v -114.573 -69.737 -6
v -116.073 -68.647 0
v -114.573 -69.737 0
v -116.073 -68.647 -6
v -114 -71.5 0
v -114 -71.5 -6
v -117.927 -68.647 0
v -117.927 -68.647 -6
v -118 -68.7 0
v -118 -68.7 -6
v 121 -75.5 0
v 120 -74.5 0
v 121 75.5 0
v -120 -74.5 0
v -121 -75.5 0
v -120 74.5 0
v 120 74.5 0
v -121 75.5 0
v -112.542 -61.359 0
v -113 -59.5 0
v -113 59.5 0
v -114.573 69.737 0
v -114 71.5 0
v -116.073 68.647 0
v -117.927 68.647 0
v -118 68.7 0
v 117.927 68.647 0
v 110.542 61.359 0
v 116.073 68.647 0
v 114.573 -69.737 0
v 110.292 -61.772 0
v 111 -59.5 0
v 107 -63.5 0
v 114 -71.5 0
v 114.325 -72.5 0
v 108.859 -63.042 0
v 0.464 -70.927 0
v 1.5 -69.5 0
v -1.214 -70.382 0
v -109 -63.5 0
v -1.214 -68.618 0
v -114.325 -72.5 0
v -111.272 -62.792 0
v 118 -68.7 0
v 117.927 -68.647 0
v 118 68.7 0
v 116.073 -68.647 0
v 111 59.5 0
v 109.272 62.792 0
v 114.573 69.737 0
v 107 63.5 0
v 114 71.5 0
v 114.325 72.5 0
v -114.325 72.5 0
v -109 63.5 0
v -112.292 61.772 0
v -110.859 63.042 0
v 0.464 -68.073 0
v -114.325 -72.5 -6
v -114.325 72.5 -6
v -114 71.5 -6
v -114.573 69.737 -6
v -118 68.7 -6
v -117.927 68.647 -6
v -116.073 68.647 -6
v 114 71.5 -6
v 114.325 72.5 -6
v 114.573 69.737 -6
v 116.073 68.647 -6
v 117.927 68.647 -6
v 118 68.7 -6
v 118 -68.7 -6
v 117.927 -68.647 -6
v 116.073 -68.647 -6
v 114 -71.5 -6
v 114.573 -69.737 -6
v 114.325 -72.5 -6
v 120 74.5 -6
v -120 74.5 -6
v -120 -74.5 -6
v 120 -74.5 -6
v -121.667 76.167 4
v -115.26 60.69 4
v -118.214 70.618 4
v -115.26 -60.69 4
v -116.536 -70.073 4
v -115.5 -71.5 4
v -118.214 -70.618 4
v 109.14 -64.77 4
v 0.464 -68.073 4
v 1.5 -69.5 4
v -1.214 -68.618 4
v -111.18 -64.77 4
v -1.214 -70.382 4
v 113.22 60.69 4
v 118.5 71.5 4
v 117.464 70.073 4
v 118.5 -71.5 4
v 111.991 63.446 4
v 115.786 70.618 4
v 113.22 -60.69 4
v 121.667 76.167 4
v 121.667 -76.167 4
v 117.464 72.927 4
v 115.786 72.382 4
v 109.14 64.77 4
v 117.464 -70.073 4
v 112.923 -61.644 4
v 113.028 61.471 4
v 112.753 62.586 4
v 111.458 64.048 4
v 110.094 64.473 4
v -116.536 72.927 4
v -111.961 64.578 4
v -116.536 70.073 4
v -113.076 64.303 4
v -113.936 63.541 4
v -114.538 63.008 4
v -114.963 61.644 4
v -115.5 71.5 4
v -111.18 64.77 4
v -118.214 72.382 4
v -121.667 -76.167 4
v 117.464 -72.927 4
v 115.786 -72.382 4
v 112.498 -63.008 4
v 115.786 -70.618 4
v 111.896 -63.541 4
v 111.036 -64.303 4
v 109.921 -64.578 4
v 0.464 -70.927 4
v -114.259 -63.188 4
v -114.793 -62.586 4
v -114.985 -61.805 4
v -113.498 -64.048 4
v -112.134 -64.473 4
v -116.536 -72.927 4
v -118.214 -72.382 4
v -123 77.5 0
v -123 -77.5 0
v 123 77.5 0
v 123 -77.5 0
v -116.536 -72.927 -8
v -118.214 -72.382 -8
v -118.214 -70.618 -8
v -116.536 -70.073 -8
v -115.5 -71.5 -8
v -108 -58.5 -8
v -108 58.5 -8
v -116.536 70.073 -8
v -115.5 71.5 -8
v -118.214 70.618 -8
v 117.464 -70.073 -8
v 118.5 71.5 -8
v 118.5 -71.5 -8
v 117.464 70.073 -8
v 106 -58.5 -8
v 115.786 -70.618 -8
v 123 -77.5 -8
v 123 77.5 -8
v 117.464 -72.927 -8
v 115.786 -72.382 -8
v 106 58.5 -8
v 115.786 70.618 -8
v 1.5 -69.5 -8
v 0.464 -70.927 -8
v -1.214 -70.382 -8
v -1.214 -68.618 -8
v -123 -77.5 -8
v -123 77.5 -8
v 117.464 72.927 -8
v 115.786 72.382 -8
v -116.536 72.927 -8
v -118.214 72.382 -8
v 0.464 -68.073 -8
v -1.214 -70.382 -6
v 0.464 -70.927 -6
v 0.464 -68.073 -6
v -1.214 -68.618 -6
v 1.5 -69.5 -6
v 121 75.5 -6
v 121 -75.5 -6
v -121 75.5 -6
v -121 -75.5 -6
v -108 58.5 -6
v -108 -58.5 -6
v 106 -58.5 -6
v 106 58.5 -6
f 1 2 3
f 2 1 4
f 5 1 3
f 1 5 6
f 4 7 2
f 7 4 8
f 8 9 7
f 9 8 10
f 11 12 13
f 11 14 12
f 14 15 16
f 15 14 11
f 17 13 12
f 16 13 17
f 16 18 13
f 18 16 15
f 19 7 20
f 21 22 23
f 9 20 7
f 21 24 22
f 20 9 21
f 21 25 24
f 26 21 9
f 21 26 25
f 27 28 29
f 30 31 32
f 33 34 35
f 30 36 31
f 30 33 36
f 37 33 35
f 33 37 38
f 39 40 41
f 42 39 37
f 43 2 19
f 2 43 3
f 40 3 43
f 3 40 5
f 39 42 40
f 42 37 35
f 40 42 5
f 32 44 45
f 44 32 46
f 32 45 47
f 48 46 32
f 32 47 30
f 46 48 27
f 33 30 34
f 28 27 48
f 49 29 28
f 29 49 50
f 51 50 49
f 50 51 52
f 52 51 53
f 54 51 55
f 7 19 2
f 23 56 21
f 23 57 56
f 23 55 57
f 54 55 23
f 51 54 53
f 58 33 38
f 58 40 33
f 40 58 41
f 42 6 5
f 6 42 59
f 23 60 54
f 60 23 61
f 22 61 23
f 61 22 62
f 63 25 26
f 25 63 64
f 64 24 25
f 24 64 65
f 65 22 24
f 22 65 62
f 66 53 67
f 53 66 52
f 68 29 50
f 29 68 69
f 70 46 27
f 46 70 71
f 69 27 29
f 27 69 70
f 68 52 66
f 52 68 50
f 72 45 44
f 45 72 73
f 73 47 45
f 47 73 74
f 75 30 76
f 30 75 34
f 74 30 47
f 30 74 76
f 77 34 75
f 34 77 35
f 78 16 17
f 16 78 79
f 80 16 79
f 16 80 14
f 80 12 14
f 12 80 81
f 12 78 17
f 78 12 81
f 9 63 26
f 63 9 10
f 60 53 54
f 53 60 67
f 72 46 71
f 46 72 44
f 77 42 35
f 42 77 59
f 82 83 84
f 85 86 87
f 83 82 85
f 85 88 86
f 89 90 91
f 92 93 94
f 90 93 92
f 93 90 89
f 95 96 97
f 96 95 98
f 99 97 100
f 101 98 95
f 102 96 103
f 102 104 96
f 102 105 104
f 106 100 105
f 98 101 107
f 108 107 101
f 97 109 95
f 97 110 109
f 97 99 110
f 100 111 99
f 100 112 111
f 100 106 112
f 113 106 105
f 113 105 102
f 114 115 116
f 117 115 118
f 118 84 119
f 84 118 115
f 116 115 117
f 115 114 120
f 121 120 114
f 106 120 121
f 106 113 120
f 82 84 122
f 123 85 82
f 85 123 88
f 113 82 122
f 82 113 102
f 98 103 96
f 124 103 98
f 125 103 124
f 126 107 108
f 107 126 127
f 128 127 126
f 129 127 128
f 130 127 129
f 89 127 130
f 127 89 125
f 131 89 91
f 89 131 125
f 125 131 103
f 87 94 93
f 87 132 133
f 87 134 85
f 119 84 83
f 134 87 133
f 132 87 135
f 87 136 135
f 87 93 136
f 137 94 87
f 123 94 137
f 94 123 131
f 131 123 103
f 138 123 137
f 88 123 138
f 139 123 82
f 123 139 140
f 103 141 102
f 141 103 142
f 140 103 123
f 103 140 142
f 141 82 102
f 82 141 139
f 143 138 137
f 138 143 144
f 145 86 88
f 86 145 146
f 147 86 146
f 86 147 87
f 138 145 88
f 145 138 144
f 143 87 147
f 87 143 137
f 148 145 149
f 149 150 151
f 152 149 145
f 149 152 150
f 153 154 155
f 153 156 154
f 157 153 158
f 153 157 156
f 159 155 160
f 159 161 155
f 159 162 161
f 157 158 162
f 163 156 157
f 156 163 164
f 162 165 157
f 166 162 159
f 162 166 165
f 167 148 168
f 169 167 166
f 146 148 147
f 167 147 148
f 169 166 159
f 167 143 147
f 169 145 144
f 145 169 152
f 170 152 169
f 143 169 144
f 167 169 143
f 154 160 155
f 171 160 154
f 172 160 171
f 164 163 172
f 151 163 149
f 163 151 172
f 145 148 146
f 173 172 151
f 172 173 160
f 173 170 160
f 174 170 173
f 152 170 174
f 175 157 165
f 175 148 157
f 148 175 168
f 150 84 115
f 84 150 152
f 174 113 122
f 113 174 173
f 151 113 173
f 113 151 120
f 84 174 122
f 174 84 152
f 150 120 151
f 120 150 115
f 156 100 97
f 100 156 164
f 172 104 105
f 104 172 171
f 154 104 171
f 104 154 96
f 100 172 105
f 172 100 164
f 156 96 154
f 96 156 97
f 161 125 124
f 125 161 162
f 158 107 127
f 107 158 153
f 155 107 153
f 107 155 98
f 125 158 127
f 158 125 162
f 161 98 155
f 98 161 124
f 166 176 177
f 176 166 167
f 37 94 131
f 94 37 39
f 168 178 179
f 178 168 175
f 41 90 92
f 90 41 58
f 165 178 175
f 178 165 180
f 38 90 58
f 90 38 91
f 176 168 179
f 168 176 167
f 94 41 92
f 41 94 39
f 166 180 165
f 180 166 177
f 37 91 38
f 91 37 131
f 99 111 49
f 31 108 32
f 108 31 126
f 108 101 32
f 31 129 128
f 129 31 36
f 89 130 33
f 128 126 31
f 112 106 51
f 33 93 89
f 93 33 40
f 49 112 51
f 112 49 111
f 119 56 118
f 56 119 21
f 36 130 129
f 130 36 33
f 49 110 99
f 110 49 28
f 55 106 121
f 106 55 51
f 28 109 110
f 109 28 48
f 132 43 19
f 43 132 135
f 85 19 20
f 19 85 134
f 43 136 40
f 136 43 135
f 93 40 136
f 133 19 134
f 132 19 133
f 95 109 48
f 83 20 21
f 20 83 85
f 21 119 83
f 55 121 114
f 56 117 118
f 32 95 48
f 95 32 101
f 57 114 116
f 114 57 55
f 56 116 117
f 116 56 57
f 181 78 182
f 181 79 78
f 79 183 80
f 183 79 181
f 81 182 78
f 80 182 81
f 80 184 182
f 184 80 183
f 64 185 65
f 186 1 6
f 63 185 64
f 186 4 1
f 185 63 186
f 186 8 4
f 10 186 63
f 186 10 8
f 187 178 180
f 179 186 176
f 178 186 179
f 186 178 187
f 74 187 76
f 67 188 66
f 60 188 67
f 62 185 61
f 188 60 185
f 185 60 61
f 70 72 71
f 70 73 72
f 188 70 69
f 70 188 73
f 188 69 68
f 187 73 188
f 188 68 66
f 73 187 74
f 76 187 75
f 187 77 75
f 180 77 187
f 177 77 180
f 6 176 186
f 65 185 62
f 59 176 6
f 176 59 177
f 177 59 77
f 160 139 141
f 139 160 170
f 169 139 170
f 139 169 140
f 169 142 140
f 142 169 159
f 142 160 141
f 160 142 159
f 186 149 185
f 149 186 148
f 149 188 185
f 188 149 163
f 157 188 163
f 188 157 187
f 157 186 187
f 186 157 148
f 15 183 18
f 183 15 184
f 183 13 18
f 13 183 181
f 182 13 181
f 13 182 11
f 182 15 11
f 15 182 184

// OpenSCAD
// file: frame_config.scad
have_buttons=0;

display_width=234;
display_height=143;
display_top_bezel=8;
display_bottom_bezel=8;
display_left_bezel=4;
display_right_bezel=6;

flange_height=5;
flange_gap=1;
flange_width=2;

faceplate_inset=2;
faceplate_lside_width=(have_buttons==1)? 22 : 6;
faceplate_rside_width=(have_buttons==1)? 20 : 6;
faceplate_top_width=6;
faceplate_bottom_width=(have_buttons==1)? 18 : 6;
faceplate_thickness=4;

backframe_thickness=8;
backframe_center_thickness=2;
backframe_inset=5;

button_width=10;
button_height=6;
button_thickness=faceplate_thickness+2;
button_rad=1;
num_bot_buttons=6;
num_side_buttons=5;
button_bottom_offset=5;
button_side_offset=5;

pcb_boss_radius=1;
pcb_thickness=1.5;

button_boss_radius=3;
button_boss_height=3.5;

backframe_boss_radius=3;
backframe_boss_height=backframe_thickness-pcb_thickness-button_boss_height;

frame_boss_radius=3;

cut_gap=.2;

// Vector of display corners
display_corners = [
    [-display_width/2-faceplate_lside_width,-display_height/2-faceplate_bottom_width,0],
    [-display_width/2-faceplate_lside_width,display_height/2+faceplate_top_width,0],
    [display_width/2+faceplate_rside_width,display_height/2+faceplate_top_width,0],
    [display_width/2+faceplate_rside_width,-display_height/2-faceplate_bottom_width,0]
];
// main file
include <frame_config.scad>

module frame_hole() {
    cylinder(h=backframe_thickness*2, r=1.5);
}

module frame_holes() {
    offset = frame_boss_radius+3;
    fho = [[offset,offset,-backframe_thickness],
        [offset,-offset,-backframe_thickness],
        [-offset,-offset,-backframe_thickness],
        [-offset,offset,-backframe_thickness]];
    trans = display_corners + fho;
    
    translate(trans[0])
        frame_hole();
    translate(trans[1])
        frame_hole();
    translate(trans[2])
        frame_hole();
    translate(trans[3])
        frame_hole();
    translate([0,-display_height/2-faceplate_bottom_width+button_bottom_offset+button_height/2,-backframe_thickness])
        frame_hole();
}

module flange(ht) {
    linear_extrude(height=ht, center=false) {
        polygon(points=[
            [-display_width/2-flange_gap,-display_height/2-flange_gap],
            [-display_width/2-flange_gap, display_height/2+flange_gap],
            [display_width/2+flange_gap, display_height/2+flange_gap],
            [display_width/2+flange_gap, -display_height/2-flange_gap],
            [-display_width/2-flange_width-flange_gap,-display_height/2-flange_width-flange_gap],
            [-display_width/2-flange_width-flange_gap, display_height/2+flange_width+flange_gap],
            [display_width/2+flange_width+flange_gap, display_height/2+flange_width+flange_gap],
            [display_width/2+flange_width+flange_gap, -display_height/2-flange_width-flange_gap]],
            paths=[[0,1,2,3],[4,5,6,7]]);
    }
}

module faceplate() {
    linear_extrude(height=faceplate_thickness, center=true) {
        polygon(points=[
            [-display_width/2+faceplate_inset+display_left_bezel,-display_height/2+faceplate_inset+display_bottom_bezel],
            [-display_width/2+faceplate_inset+display_left_bezel, display_height/2-faceplate_inset-display_top_bezel],
            [display_width/2-faceplate_inset-display_right_bezel, display_height/2-faceplate_inset-display_top_bezel],
            [display_width/2-faceplate_inset-display_right_bezel, -display_height/2+faceplate_inset+display_bottom_bezel],
            [-display_width/2-faceplate_lside_width,-display_height/2-faceplate_bottom_width],
            [-display_width/2-faceplate_lside_width, display_height/2+faceplate_top_width],
            [display_width/2+faceplate_rside_width, display_height/2+faceplate_top_width],
            [display_width/2+faceplate_rside_width, -display_height/2-faceplate_bottom_width]],
            paths=[[0,1,2,3],[4,5,6,7]]);
    }
}

module button_hole() {
    minkowski() {
        cube([button_width, button_height, faceplate_thickness], center=true);
        cylinder(r=button_rad, h=1, $fn=50);
    }
}

module bottom_button_holes() {
    for(i=[0:num_bot_buttons-1]) {
        xint = display_width/(num_bot_buttons+1);
        x = xint * (num_bot_buttons/2 - i);
        translate([x-xint/2,-display_height/2-faceplate_bottom_width+button_bottom_offset+button_height/2,2])
            button_hole();
    }
}

module left_button_holes() {
    for(i=[0:num_side_buttons-1]) {
        yint = display_height/(num_side_buttons+1);
        y = yint * (num_side_buttons/2 - i);
        translate([-display_width/2-faceplate_lside_width+button_side_offset+button_width/2,y-yint/2,2])
            button_hole();
    }
}

module right_button_holes() {
    for(i=[0:num_side_buttons-1]) {
        yint = display_height/(num_side_buttons+1);
        y = yint * (num_side_buttons/2 - i);
        translate([display_width/2+faceplate_rside_width-button_side_offset-button_width/2,y-yint/2,2])
            button_hole();
    }
}

module button_holes() {
    left_button_holes();
    bottom_button_holes();
    right_button_holes();
}

module button_pcb_boss() {
    cylinder(h=button_boss_height,r=button_boss_radius);
    translate([0,0,-pcb_thickness])
        cylinder(h=pcb_thickness,r=pcb_boss_radius,$fn=36);
}

module left_button_pcb_bosses() {
    for(i=[0:num_side_buttons]) {
        yint = display_height/(num_side_buttons+1);
        y = yint * (num_side_buttons/2 - i + 1);
        translate([-display_width/2-faceplate_lside_width+button_side_offset+button_width/2,y-yint,-button_boss_height])
           button_pcb_boss();
    }
}
    
module right_button_pcb_bosses() {
    for(i=[0:num_side_buttons]) {
        yint = display_height/(num_side_buttons+1);
        y = yint * (num_side_buttons/2 - i + 1);
        translate([display_width/2+faceplate_rside_width-button_side_offset-button_width/2,y-yint,-button_boss_height])
            button_pcb_boss();
        }
}
    
module bottom_button_pcb_bosses() {
    for(i=[0:num_bot_buttons]) {
        xint = display_width/(num_bot_buttons+1);
        x = xint * (num_bot_buttons/2 - i + 1);
        translate([x-xint,-display_height/2-    faceplate_bottom_width+button_bottom_offset+button_height/2,-button_boss_height])
            button_pcb_boss();
    }
}

module outside_trim() {
    linear_extrude(height=display_width*2, center=true)
        polygon(points=[[-2,0],[-2,faceplate_thickness+2],[2,faceplate_thickness+2],[0,0],[-2,0]]);
}

module outside_trim_all() {
    translate([-display_width/2-faceplate_lside_width,0,0])
        rotate(a=[90,0,0])
            outside_trim();
    translate([display_width/2+faceplate_rside_width,0,0])
        rotate(a=[90,0,180])
            outside_trim();
    translate([0,-display_height/2-faceplate_bottom_width,0])
        rotate(a=[90,0,90])
            outside_trim();
    translate([0,display_height/2+faceplate_top_width,0])
        rotate(a=[90,0,-90])
            outside_trim();
}

module faceplate_inner_trim() {
    linear_extrude(height=10, scale=1.05)
    offset(r=faceplate_inset+2)
        polygon(points=[
            [-display_width/2+faceplate_inset+2+display_left_bezel,-display_height/2+faceplate_inset+2+display_bottom_bezel],
            [-display_width/2+faceplate_inset+2+display_left_bezel, display_height/2-faceplate_inset-2-display_top_bezel],
            [display_width/2-faceplate_inset-2-display_right_bezel, display_height/2-faceplate_inset-2-display_top_bezel],
            [display_width/2-faceplate_inset-2-display_right_bezel,-display_height/2+faceplate_inset+2+display_bottom_bezel]]);
}

module front_frame_boss() {
    cylinder(h=flange_height,r=frame_boss_radius);
}

module front_frame_bosses() {
    offset = frame_boss_radius+3;
    ffb = [[offset,offset,-flange_height],
        [offset,-offset,-flange_height],
        [-offset,-offset,-flange_height],
        [-offset,offset,-flange_height]];
    trans = display_corners + ffb;
    
    translate(trans[0])
        front_frame_boss();
    translate(trans[1])
        front_frame_boss();
    translate(trans[2])
        front_frame_boss();
    translate(trans[3])
        front_frame_boss();
}

module faceplate_assembly() {
    translate([0,0,-flange_height])
        flange(flange_height);
    translate([0,0,faceplate_thickness/2])
        faceplate();
    if (have_buttons==1) left_button_pcb_bosses();
    if (have_buttons==1) right_button_pcb_bosses();
    if (have_buttons==1) bottom_button_pcb_bosses();
    front_frame_bosses();
}

module front_frame() {
    difference() {
        faceplate_assembly();
        outside_trim_all();
        if (have_buttons==1) button_holes();
        faceplate_inner_trim();
        frame_holes();
    }
}

module back_frame_plate() {
    linear_extrude(height=backframe_center_thickness, center=false) {
        polygon(points=[
            [-display_width/2+backframe_inset+display_left_bezel,-display_height/2+backframe_inset+display_bottom_bezel],
            [-display_width/2+backframe_inset+display_left_bezel, display_height/2-backframe_inset-display_top_bezel],
            [display_width/2-backframe_inset-display_right_bezel, display_height/2-backframe_inset-display_top_bezel],
            [display_width/2-backframe_inset-display_right_bezel, -display_height/2+backframe_inset+display_bottom_bezel],
            [-display_width/2-faceplate_lside_width,-display_height/2-faceplate_bottom_width],
            [-display_width/2-faceplate_lside_width, display_height/2+faceplate_top_width],
            [display_width/2+faceplate_rside_width, display_height/2+faceplate_top_width],
            [display_width/2+faceplate_rside_width, -display_height/2-faceplate_bottom_width]],
            paths=[[0,1,2,3],[4,5,6,7]]);
    }
}

module back_frame_outer_flange() {
    linear_extrude(height=backframe_thickness, center=true) {
        polygon(points=[
            [-display_width/2-faceplate_lside_width,-display_height/2-faceplate_bottom_width],
            [-display_width/2-faceplate_lside_width, display_height/2+faceplate_top_width],
            [display_width/2+faceplate_rside_width, display_height/2+faceplate_top_width],
            [display_width/2+faceplate_rside_width, -display_height/2-faceplate_bottom_width],

            [-display_width/2-faceplate_lside_width+2,-display_height/2-faceplate_bottom_width+2],
            [-display_width/2-faceplate_lside_width+2, display_height/2+faceplate_top_width-2],
            [display_width/2+faceplate_rside_width-2, display_height/2+faceplate_top_width-2],
            [display_width/2+faceplate_rside_width-2, -display_height/2-faceplate_bottom_width+2]],
            paths=[[0,1,2,3],[4,5,6,7]]);
    }
}

module back_pcb_boss() {
    cylinder(h=backframe_boss_height,r=backframe_boss_radius);
}

module left_back_pcb_bosses() {
    for(i=[0:num_side_buttons]) {
        yint = display_height/(num_side_buttons+1);
        y = yint * (num_side_buttons/2 - i + 1);
        translate([-display_width/2-faceplate_lside_width+button_side_offset+button_width/2,y-yint,-backframe_thickness])
            back_pcb_boss();
    }
}
    
module right_back_pcb_bosses() {
    for(i=[0:num_side_buttons]) {
        yint = display_height/(num_side_buttons+1);
        y = yint * (num_side_buttons/2 - i + 1);
        translate([display_width/2+faceplate_rside_width-button_side_offset-button_width/2,y-yint,-backframe_thickness])
            back_pcb_boss();
    }
}
    
module bottom_back_pcb_bosses() {
    for(i=[0:num_bot_buttons]) {
        xint = display_width/(num_bot_buttons+1);
        x = xint * (num_bot_buttons/2 - i + 1);
        translate([x-xint,-display_height/2-    faceplate_bottom_width+button_bottom_offset+button_height/2,-backframe_thickness])
            back_pcb_boss();
    }
}

module frame_boss() {
    cylinder(h=backframe_thickness-flange_height,r=frame_boss_radius);
}

module back_frame_bosses() {
    offset = frame_boss_radius+3;
    bfb = [[offset,offset,-backframe_thickness],
        [offset,-offset,-backframe_thickness],
        [-offset,-offset,-backframe_thickness],
        [-offset,offset,-backframe_thickness]];
    trans = display_corners + bfb;
    
    translate(trans[0])
        frame_boss();
    translate(trans[1])
        frame_boss();
    translate(trans[2])
        frame_boss();
    translate(trans[3])
        frame_boss();
}

module bottom_connector_hole() {
    xint = display_width/(num_bot_buttons+1);
    translate([-xint/2-7.5,-display_height/2-faceplate_bottom_width+button_bottom_offset+button_height/2-4,-15])
        cube([15,8,20]);
}

module left_side_connector_hole() {
    translate([-display_width/2-faceplate_lside_width+button_side_offset+button_width/2+4,-7,-15])
        rotate(a=[0,0,90])
            cube([14,8,20]);
}

module right_side_connector_hole() {
    translate([display_width/2+faceplate_rside_width-button_side_offset-button_width/2+4,-7,-15])
        rotate(a=[0,0,90])
            cube([14,8,20]);
}

module back_frame_assy() {
    translate([0,0,-backframe_thickness])
        back_frame_plate();
    translate([0,0,-backframe_thickness/2])
        back_frame_outer_flange();
    translate([0,0,-backframe_thickness])
        flange(backframe_thickness-flange_height);
    if (have_buttons==1) left_back_pcb_bosses();
    if (have_buttons==1) right_back_pcb_bosses();
    if (have_buttons==1) bottom_back_pcb_bosses();
    back_frame_bosses();
}

module back_frame() {
    difference() {
        back_frame_assy();
        frame_holes();
        if (have_buttons==1) bottom_connector_hole();
        if (have_buttons==1) left_side_connector_hole();
        if (have_buttons==1) right_side_connector_hole();
    }
}

front_frame();
back_frame();
